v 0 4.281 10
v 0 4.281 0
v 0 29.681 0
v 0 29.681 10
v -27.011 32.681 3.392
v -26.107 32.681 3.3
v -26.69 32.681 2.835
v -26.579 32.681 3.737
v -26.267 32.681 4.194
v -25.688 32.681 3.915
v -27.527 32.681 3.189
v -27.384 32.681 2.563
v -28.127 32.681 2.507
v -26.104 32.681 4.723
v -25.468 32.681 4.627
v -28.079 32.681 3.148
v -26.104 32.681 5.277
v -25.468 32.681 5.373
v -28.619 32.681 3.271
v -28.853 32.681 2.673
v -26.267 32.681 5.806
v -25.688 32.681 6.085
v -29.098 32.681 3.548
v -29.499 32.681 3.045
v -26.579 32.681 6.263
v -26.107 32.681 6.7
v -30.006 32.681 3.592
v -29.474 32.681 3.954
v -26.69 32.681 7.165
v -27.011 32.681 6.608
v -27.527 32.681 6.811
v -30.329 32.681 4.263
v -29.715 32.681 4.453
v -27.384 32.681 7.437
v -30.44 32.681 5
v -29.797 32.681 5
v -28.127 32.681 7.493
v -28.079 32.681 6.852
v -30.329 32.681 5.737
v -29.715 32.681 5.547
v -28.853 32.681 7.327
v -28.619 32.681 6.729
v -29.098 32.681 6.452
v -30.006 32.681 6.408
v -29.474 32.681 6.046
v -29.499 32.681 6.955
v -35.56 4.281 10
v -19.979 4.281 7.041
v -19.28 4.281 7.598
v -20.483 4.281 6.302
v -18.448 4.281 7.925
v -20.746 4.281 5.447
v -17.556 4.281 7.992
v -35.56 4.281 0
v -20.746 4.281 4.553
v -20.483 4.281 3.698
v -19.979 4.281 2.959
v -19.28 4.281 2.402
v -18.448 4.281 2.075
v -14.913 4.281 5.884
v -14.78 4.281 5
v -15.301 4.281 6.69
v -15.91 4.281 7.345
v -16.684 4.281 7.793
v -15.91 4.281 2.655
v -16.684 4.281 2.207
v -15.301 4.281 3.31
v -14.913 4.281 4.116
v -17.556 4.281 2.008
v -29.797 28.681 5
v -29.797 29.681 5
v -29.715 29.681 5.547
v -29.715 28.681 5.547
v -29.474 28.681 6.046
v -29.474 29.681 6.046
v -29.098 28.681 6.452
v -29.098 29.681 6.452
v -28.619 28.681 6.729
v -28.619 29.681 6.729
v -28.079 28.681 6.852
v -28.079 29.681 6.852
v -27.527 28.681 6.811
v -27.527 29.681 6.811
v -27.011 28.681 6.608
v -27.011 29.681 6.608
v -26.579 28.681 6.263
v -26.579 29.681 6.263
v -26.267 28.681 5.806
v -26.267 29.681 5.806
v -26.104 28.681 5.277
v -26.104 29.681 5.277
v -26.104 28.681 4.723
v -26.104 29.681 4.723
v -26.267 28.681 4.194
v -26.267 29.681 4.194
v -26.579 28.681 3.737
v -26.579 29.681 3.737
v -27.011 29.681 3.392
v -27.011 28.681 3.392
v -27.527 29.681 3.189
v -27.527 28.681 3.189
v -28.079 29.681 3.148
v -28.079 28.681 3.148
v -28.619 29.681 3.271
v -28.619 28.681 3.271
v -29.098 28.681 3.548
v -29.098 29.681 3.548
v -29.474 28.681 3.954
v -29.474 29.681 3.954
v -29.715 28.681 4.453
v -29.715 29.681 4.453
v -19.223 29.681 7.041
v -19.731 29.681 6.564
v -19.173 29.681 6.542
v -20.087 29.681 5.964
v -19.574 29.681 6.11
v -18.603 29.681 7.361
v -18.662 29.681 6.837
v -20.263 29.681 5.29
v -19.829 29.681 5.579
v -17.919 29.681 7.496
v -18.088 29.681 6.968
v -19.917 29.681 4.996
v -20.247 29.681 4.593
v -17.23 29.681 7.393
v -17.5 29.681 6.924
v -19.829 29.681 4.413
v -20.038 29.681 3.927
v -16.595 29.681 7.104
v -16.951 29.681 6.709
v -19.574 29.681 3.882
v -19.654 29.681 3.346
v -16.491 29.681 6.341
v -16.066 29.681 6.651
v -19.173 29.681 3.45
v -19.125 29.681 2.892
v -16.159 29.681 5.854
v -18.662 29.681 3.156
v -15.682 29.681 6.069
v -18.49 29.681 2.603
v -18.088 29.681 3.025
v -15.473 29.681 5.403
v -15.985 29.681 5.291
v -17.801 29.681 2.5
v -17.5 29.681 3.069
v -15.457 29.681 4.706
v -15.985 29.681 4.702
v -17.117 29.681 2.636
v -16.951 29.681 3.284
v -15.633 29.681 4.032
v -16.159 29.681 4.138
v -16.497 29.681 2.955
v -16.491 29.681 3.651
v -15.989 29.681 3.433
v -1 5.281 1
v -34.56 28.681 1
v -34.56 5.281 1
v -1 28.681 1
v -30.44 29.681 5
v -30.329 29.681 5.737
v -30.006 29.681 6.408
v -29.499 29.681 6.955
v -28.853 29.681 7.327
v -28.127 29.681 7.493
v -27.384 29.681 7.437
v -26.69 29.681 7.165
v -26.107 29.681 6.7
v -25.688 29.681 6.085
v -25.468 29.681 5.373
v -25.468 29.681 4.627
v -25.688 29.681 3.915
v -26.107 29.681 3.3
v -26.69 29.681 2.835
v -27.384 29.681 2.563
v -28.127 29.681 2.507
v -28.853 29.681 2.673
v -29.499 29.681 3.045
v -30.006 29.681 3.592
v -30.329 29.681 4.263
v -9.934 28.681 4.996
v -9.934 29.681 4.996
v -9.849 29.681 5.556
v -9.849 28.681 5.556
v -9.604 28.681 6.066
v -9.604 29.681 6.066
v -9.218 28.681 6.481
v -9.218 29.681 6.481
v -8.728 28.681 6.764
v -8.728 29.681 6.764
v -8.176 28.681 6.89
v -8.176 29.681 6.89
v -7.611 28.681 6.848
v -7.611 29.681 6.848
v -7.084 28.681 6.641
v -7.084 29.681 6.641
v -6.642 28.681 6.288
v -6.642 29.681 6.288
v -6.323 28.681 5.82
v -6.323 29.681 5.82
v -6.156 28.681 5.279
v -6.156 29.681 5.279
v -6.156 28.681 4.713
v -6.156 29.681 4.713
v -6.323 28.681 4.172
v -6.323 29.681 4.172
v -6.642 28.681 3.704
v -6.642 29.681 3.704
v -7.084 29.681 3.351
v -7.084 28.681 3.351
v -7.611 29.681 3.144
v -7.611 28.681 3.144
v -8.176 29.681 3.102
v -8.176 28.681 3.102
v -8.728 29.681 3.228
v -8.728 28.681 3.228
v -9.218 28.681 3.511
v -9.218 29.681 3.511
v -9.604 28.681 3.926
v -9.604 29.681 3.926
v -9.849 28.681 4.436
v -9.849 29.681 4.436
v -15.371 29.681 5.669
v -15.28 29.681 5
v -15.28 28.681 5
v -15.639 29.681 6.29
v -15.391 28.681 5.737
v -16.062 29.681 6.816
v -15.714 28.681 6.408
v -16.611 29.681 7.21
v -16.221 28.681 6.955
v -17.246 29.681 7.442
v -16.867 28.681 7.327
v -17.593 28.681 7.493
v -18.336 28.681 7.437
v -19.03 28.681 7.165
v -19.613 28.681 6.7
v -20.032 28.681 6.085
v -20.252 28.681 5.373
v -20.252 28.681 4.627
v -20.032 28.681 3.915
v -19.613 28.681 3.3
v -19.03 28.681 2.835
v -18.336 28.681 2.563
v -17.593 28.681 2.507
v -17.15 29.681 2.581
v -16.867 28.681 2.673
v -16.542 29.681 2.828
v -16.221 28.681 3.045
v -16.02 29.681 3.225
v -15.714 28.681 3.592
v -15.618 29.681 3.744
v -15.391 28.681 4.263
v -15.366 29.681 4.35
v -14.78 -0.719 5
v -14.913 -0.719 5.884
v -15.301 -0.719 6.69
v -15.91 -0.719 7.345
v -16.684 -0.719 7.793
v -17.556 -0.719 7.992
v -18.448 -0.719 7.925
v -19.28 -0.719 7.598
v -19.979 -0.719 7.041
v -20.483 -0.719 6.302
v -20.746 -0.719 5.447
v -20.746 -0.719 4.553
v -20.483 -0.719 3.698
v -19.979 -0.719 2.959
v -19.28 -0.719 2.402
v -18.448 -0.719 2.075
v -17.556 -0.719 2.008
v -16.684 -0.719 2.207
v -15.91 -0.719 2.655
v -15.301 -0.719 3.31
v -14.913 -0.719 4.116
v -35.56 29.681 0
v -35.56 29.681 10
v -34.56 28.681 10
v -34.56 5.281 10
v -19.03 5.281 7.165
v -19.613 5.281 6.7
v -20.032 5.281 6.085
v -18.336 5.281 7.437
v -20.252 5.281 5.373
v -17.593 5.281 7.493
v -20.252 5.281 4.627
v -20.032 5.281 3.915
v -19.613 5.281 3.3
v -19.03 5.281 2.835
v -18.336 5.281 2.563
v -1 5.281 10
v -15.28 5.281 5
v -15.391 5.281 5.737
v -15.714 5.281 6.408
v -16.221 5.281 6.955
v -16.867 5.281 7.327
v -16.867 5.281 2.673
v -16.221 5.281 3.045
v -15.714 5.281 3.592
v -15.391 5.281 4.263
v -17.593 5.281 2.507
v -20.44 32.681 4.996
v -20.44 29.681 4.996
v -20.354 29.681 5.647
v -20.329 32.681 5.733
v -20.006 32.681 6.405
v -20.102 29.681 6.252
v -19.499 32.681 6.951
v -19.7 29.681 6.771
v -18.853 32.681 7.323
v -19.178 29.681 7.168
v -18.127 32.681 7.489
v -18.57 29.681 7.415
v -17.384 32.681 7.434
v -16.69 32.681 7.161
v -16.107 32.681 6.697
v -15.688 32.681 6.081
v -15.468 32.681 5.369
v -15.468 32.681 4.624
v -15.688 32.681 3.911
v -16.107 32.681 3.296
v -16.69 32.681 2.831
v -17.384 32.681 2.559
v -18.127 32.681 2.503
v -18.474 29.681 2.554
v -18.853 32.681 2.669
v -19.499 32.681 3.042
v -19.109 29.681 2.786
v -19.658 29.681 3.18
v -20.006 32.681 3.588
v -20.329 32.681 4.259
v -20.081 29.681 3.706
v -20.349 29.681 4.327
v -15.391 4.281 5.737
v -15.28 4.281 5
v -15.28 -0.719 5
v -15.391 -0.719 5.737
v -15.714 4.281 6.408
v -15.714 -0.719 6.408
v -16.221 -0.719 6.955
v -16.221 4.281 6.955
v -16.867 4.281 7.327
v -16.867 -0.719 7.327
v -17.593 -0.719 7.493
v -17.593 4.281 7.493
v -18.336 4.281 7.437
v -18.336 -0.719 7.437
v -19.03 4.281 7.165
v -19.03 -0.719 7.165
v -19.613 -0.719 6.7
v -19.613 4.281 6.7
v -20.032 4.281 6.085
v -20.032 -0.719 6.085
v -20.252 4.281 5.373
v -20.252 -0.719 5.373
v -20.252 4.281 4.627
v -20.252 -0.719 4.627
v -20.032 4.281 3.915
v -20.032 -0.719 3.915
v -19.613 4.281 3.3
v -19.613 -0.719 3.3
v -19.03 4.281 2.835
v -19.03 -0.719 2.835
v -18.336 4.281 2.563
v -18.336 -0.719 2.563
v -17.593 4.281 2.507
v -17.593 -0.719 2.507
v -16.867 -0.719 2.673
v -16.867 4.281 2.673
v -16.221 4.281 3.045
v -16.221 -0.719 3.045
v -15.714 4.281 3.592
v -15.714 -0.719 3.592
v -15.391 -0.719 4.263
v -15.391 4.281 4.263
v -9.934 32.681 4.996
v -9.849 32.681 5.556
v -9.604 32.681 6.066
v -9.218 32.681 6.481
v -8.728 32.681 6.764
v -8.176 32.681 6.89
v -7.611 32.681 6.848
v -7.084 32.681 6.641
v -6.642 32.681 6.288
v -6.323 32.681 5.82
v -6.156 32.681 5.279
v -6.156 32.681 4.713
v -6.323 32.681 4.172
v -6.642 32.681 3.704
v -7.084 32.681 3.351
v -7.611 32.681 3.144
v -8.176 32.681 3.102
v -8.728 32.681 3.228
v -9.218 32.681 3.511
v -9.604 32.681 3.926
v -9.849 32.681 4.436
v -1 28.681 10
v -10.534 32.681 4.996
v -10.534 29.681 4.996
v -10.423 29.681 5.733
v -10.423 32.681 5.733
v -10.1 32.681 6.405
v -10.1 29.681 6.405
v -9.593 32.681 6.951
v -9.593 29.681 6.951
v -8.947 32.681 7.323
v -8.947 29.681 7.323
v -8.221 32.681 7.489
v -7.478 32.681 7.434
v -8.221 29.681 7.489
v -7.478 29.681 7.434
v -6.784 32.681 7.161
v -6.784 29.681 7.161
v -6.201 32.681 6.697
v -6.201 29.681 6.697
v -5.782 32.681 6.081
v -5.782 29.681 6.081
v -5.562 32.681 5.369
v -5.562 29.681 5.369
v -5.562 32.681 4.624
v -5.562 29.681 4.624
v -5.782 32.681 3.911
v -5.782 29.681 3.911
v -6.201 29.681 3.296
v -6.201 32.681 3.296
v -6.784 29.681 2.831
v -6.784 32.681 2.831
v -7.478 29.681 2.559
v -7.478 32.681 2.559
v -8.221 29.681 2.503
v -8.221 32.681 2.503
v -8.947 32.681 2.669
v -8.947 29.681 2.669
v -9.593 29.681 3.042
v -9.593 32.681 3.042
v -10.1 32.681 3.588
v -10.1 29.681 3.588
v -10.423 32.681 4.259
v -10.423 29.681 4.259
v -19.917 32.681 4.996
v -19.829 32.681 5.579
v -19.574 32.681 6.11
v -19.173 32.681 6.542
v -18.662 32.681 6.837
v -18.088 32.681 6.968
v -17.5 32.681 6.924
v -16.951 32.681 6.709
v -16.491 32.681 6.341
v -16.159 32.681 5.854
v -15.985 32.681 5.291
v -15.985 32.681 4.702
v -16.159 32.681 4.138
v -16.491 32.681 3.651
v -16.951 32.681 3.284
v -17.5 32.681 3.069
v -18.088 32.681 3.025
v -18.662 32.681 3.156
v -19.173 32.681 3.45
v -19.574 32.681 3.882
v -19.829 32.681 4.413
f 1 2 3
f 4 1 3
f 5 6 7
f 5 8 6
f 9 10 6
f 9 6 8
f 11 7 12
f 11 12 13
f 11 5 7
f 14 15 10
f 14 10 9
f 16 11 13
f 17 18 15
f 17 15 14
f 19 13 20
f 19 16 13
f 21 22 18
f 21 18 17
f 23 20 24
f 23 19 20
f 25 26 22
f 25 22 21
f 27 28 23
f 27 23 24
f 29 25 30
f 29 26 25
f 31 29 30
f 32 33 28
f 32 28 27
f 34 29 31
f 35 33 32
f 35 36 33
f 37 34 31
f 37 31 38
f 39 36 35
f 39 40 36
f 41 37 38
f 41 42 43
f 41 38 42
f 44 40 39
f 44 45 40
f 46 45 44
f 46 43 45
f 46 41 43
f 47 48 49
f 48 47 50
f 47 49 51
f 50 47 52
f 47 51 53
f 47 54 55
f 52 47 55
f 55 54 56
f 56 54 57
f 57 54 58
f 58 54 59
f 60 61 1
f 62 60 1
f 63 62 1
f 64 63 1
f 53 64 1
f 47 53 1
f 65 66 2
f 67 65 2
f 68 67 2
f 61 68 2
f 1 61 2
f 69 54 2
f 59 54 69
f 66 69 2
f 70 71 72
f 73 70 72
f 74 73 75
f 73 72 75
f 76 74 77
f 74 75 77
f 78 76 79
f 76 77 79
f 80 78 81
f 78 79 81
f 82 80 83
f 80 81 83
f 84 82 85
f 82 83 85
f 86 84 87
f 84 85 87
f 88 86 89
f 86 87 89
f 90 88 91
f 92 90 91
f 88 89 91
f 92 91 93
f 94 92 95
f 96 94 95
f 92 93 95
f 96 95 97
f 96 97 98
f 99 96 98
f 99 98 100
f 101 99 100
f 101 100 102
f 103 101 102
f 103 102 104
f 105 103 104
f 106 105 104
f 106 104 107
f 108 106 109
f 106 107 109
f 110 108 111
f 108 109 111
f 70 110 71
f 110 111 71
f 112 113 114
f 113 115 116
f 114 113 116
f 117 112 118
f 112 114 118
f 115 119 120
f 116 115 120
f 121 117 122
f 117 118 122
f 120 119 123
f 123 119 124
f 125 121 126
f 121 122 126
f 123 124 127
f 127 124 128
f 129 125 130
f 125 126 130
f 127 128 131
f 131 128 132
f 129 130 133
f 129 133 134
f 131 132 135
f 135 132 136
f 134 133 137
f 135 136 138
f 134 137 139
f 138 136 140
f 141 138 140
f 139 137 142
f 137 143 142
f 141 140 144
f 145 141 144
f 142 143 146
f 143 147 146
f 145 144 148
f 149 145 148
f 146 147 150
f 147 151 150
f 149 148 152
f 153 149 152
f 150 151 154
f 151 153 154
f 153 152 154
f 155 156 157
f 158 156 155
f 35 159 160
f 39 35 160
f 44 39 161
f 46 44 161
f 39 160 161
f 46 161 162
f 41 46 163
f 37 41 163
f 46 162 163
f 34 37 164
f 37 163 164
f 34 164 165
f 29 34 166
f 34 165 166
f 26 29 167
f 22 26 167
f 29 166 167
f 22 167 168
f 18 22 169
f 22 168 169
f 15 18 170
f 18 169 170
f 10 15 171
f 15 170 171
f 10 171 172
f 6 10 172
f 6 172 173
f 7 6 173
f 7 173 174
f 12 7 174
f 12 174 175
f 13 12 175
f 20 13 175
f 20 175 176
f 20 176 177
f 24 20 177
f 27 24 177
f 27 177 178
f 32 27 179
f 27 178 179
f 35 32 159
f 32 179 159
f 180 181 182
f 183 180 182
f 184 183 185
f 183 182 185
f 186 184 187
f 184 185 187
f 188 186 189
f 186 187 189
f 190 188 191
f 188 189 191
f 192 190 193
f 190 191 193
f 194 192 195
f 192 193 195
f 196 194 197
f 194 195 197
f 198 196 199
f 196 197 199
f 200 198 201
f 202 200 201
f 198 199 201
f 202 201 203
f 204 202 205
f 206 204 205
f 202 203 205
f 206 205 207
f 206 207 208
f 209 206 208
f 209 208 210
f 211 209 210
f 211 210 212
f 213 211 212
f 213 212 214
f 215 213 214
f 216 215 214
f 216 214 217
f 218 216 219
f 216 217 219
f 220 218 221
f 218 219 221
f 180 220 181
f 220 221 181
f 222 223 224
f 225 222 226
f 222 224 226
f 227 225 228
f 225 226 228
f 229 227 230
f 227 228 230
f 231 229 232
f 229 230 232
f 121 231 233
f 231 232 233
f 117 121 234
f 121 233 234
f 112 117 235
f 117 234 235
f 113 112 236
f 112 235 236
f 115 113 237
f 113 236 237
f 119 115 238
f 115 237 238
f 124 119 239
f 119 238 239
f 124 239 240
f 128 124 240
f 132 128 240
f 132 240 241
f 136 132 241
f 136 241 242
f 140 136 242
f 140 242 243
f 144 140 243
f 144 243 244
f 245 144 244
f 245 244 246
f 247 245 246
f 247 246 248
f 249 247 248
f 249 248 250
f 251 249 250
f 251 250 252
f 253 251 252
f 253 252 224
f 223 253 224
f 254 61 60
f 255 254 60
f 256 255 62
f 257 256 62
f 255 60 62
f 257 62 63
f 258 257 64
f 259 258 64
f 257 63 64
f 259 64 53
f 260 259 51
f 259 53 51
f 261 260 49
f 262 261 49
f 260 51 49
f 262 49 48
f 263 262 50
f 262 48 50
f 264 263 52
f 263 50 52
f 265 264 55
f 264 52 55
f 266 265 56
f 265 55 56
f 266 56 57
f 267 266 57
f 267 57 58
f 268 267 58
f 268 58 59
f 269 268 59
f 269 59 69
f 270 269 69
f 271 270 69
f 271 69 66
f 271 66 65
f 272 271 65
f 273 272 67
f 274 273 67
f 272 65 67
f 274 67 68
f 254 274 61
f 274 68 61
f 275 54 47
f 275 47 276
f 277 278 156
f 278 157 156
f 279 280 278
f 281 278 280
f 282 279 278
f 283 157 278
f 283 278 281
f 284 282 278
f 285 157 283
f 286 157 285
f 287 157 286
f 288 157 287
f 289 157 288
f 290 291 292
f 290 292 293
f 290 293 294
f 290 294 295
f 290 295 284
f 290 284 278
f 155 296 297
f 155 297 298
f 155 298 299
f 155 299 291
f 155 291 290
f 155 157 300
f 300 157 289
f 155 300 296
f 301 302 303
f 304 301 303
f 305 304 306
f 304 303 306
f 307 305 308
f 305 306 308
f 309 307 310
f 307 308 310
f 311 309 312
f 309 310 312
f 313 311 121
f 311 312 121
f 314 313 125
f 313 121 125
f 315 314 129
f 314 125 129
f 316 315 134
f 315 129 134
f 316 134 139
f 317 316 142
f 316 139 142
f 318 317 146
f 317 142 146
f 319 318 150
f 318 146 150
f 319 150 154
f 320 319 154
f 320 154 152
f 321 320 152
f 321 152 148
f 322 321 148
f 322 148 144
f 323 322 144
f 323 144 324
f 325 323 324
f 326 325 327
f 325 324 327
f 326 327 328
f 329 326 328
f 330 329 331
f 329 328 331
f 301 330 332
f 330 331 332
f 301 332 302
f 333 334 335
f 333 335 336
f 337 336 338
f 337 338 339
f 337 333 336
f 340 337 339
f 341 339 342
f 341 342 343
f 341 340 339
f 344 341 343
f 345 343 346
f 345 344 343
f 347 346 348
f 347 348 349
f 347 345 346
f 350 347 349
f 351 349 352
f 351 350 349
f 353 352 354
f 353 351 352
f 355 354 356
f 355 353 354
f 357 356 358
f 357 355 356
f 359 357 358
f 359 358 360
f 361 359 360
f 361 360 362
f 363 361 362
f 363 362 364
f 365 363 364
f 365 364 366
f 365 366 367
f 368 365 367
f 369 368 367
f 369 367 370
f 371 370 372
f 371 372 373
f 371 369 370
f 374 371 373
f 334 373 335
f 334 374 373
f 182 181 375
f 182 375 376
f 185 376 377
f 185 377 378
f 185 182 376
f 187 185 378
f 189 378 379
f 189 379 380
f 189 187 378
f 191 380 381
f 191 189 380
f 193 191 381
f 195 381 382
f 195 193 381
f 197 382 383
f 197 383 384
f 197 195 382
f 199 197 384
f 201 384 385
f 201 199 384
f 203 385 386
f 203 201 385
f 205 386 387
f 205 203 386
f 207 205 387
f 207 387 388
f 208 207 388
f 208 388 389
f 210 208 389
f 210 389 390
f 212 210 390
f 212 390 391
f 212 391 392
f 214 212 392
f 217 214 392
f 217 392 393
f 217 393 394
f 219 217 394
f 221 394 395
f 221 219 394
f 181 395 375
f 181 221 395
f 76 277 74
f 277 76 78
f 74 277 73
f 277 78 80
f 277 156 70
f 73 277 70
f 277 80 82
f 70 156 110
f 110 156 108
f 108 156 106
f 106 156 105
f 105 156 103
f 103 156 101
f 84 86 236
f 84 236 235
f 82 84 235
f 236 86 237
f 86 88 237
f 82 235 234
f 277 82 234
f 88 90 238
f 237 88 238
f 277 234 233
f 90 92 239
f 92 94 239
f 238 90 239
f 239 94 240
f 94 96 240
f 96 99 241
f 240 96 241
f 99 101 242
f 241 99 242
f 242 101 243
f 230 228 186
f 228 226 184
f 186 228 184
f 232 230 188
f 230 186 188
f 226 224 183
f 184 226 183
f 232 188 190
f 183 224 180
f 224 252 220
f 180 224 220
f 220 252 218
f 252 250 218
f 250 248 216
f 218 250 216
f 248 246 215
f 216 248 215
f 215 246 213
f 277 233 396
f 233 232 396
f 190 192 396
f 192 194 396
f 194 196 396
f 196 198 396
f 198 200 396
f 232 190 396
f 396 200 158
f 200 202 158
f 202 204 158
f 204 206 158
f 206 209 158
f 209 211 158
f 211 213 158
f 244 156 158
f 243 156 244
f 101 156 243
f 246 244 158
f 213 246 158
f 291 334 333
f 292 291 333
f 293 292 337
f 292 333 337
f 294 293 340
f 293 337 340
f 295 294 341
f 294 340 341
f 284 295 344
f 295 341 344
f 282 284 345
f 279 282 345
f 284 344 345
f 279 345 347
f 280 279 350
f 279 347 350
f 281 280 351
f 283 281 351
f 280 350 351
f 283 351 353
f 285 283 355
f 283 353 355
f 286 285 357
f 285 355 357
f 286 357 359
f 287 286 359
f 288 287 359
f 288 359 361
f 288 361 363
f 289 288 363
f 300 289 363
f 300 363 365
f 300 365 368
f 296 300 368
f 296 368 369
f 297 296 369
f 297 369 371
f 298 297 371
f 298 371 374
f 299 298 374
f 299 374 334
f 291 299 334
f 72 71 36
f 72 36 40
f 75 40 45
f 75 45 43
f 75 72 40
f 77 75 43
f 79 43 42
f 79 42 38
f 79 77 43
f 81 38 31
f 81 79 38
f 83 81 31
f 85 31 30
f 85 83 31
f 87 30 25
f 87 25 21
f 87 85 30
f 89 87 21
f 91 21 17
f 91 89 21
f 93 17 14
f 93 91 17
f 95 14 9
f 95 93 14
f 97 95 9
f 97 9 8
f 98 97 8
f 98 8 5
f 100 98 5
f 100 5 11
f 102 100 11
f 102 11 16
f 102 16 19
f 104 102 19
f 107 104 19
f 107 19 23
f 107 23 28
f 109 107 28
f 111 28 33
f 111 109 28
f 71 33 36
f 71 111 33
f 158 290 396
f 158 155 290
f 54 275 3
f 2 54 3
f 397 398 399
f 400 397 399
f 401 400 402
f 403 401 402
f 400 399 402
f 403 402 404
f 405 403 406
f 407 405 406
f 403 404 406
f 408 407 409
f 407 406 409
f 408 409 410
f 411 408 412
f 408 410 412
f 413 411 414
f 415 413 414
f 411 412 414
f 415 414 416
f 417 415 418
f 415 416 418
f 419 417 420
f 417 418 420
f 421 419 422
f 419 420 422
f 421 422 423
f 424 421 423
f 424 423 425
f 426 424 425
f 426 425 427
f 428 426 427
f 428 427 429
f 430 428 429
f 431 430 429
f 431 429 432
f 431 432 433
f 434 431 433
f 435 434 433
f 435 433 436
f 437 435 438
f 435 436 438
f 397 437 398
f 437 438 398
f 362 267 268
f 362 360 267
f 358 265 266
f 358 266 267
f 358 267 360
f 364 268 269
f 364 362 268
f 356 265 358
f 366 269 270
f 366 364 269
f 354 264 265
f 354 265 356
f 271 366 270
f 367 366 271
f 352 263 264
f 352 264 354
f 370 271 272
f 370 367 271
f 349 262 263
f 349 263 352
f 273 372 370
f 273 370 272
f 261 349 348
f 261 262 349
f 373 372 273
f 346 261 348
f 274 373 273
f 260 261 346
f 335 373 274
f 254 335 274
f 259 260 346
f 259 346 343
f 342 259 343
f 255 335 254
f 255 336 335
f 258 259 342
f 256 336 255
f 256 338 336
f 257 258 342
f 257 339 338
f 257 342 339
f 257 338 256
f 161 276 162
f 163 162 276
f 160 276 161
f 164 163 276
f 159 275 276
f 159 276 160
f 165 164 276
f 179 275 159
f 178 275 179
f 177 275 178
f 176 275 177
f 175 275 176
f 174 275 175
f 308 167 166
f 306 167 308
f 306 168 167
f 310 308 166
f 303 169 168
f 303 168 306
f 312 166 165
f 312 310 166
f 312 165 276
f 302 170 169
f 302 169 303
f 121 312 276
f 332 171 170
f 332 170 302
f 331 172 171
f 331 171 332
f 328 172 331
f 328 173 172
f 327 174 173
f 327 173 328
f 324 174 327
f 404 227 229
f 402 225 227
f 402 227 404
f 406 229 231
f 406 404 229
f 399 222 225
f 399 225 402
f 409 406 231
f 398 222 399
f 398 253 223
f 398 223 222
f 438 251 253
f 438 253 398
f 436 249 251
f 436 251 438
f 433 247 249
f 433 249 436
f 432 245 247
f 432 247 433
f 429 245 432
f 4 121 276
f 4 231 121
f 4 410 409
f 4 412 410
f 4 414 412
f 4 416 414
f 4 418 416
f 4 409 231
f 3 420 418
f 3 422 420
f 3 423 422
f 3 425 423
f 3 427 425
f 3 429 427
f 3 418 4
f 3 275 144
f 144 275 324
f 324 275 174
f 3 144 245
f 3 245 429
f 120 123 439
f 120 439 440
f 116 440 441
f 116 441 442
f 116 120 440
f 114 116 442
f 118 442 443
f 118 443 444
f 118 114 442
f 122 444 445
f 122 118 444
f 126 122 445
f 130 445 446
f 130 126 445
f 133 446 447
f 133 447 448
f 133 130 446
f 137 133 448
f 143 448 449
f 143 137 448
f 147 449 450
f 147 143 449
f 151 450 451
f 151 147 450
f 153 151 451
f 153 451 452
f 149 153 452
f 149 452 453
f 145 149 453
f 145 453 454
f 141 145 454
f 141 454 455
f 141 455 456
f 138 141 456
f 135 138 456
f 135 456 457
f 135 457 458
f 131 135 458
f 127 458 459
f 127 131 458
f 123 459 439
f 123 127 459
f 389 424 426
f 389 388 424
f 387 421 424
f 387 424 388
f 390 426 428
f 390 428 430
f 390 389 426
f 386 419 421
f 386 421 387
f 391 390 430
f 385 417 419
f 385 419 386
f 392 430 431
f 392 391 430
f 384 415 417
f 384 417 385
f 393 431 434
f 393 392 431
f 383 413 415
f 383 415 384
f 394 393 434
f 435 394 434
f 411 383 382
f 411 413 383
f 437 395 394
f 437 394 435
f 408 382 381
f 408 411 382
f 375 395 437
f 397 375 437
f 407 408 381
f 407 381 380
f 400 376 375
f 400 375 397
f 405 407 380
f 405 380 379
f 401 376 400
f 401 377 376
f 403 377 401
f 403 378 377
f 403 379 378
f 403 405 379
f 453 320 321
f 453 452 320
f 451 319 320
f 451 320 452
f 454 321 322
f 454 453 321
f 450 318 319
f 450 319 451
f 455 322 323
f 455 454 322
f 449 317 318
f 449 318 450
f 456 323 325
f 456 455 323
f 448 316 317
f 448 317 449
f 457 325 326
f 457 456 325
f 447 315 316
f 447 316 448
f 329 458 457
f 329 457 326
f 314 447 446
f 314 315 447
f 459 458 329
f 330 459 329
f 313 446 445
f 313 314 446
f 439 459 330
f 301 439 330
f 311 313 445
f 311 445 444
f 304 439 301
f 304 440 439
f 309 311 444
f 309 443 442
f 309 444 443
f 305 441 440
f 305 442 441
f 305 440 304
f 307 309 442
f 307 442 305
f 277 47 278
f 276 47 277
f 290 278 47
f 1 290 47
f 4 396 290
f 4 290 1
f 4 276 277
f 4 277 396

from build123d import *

# Parameters (mm, degrees)
F0_W     = 35.56
F0_H     = 25.4
F1_DEPTH = 10
F3_T     = -1
F2_R     = 2.5
F2_R_2   = 1.8571721373
F2_R_3   = 1.9771948061
F2_R_4   = 1.8995875302
F4_DEPTH = 3
F5_DEPTH = 1
F6_R     = 3
F6_R_2   = 2.5
F7_DEPTH = 5
F8_DEPTH = 25.4


with BuildPart() as f1:
    # F0 (on Top) → F1 (new body)
    with BuildSketch(Plane.XY):
        with Locations((-17.78, 16.9808987513)):
            Rectangle(F0_W, F0_H)
    extrude(amount=F1_DEPTH)

    # F3
    f3_openings = [f1.faces().sort_by_distance(p)[0] for p in [
        (-17.78, 16.980899, 10),
    ]]
    offset(amount=F3_T, openings=f3_openings)

    # F2 (on face) → F4 (join)
    with BuildSketch(Plane(origin=(0, 29.6808987513, 0), x_dir=(-1, 0, 0), z_dir=(0, 1, 0))):
        with Locations((27.94, 5)):
            Circle(F2_R)
        with Locations((27.94, 5)):
            Circle(F2_R_2, mode=Mode.SUBTRACT)
        with Locations((17.94, 4.9962)):
            Circle(F2_R)
        with Locations((17.94, 4.9962)):
            Circle(F2_R_3, mode=Mode.SUBTRACT)
        with Locations((8.034, 4.9962)):
            Circle(F2_R)
        with Locations((8.034, 4.9962)):
            Circle(F2_R_4, mode=Mode.SUBTRACT)
    extrude(amount=F4_DEPTH)

    # F5 (cut, through all): faces of the model
    f5_faces = [f1.faces().sort_by_distance(p)[0] for p in [
        (-27.94, 29.6808987513, 5),
        (-17.94, 29.6808987513, 4.9962),
        (-8.034, 29.6808987513, 4.9962),
    ]]
    extrude(f5_faces, amount=-F5_DEPTH, mode=Mode.SUBTRACT)

    # F6 (on face) → F7 (join)
    with BuildSketch(Plane.XZ.offset(-4.2808987513)):
        with Locations((-17.78, 5)):
            Circle(F6_R)
        with Locations((-17.78, 5)):
            Circle(F6_R_2, mode=Mode.SUBTRACT)
    extrude(amount=F7_DEPTH)

    # F8 (cut): a face of the model
    f8_faces = [f1.faces().sort_by_distance(p)[0] for p in [
        (-17.78, 4.2808987513, 5),
    ]]
    extrude(f8_faces, amount=-F8_DEPTH, mode=Mode.SUBTRACT)


solid = f1.part
